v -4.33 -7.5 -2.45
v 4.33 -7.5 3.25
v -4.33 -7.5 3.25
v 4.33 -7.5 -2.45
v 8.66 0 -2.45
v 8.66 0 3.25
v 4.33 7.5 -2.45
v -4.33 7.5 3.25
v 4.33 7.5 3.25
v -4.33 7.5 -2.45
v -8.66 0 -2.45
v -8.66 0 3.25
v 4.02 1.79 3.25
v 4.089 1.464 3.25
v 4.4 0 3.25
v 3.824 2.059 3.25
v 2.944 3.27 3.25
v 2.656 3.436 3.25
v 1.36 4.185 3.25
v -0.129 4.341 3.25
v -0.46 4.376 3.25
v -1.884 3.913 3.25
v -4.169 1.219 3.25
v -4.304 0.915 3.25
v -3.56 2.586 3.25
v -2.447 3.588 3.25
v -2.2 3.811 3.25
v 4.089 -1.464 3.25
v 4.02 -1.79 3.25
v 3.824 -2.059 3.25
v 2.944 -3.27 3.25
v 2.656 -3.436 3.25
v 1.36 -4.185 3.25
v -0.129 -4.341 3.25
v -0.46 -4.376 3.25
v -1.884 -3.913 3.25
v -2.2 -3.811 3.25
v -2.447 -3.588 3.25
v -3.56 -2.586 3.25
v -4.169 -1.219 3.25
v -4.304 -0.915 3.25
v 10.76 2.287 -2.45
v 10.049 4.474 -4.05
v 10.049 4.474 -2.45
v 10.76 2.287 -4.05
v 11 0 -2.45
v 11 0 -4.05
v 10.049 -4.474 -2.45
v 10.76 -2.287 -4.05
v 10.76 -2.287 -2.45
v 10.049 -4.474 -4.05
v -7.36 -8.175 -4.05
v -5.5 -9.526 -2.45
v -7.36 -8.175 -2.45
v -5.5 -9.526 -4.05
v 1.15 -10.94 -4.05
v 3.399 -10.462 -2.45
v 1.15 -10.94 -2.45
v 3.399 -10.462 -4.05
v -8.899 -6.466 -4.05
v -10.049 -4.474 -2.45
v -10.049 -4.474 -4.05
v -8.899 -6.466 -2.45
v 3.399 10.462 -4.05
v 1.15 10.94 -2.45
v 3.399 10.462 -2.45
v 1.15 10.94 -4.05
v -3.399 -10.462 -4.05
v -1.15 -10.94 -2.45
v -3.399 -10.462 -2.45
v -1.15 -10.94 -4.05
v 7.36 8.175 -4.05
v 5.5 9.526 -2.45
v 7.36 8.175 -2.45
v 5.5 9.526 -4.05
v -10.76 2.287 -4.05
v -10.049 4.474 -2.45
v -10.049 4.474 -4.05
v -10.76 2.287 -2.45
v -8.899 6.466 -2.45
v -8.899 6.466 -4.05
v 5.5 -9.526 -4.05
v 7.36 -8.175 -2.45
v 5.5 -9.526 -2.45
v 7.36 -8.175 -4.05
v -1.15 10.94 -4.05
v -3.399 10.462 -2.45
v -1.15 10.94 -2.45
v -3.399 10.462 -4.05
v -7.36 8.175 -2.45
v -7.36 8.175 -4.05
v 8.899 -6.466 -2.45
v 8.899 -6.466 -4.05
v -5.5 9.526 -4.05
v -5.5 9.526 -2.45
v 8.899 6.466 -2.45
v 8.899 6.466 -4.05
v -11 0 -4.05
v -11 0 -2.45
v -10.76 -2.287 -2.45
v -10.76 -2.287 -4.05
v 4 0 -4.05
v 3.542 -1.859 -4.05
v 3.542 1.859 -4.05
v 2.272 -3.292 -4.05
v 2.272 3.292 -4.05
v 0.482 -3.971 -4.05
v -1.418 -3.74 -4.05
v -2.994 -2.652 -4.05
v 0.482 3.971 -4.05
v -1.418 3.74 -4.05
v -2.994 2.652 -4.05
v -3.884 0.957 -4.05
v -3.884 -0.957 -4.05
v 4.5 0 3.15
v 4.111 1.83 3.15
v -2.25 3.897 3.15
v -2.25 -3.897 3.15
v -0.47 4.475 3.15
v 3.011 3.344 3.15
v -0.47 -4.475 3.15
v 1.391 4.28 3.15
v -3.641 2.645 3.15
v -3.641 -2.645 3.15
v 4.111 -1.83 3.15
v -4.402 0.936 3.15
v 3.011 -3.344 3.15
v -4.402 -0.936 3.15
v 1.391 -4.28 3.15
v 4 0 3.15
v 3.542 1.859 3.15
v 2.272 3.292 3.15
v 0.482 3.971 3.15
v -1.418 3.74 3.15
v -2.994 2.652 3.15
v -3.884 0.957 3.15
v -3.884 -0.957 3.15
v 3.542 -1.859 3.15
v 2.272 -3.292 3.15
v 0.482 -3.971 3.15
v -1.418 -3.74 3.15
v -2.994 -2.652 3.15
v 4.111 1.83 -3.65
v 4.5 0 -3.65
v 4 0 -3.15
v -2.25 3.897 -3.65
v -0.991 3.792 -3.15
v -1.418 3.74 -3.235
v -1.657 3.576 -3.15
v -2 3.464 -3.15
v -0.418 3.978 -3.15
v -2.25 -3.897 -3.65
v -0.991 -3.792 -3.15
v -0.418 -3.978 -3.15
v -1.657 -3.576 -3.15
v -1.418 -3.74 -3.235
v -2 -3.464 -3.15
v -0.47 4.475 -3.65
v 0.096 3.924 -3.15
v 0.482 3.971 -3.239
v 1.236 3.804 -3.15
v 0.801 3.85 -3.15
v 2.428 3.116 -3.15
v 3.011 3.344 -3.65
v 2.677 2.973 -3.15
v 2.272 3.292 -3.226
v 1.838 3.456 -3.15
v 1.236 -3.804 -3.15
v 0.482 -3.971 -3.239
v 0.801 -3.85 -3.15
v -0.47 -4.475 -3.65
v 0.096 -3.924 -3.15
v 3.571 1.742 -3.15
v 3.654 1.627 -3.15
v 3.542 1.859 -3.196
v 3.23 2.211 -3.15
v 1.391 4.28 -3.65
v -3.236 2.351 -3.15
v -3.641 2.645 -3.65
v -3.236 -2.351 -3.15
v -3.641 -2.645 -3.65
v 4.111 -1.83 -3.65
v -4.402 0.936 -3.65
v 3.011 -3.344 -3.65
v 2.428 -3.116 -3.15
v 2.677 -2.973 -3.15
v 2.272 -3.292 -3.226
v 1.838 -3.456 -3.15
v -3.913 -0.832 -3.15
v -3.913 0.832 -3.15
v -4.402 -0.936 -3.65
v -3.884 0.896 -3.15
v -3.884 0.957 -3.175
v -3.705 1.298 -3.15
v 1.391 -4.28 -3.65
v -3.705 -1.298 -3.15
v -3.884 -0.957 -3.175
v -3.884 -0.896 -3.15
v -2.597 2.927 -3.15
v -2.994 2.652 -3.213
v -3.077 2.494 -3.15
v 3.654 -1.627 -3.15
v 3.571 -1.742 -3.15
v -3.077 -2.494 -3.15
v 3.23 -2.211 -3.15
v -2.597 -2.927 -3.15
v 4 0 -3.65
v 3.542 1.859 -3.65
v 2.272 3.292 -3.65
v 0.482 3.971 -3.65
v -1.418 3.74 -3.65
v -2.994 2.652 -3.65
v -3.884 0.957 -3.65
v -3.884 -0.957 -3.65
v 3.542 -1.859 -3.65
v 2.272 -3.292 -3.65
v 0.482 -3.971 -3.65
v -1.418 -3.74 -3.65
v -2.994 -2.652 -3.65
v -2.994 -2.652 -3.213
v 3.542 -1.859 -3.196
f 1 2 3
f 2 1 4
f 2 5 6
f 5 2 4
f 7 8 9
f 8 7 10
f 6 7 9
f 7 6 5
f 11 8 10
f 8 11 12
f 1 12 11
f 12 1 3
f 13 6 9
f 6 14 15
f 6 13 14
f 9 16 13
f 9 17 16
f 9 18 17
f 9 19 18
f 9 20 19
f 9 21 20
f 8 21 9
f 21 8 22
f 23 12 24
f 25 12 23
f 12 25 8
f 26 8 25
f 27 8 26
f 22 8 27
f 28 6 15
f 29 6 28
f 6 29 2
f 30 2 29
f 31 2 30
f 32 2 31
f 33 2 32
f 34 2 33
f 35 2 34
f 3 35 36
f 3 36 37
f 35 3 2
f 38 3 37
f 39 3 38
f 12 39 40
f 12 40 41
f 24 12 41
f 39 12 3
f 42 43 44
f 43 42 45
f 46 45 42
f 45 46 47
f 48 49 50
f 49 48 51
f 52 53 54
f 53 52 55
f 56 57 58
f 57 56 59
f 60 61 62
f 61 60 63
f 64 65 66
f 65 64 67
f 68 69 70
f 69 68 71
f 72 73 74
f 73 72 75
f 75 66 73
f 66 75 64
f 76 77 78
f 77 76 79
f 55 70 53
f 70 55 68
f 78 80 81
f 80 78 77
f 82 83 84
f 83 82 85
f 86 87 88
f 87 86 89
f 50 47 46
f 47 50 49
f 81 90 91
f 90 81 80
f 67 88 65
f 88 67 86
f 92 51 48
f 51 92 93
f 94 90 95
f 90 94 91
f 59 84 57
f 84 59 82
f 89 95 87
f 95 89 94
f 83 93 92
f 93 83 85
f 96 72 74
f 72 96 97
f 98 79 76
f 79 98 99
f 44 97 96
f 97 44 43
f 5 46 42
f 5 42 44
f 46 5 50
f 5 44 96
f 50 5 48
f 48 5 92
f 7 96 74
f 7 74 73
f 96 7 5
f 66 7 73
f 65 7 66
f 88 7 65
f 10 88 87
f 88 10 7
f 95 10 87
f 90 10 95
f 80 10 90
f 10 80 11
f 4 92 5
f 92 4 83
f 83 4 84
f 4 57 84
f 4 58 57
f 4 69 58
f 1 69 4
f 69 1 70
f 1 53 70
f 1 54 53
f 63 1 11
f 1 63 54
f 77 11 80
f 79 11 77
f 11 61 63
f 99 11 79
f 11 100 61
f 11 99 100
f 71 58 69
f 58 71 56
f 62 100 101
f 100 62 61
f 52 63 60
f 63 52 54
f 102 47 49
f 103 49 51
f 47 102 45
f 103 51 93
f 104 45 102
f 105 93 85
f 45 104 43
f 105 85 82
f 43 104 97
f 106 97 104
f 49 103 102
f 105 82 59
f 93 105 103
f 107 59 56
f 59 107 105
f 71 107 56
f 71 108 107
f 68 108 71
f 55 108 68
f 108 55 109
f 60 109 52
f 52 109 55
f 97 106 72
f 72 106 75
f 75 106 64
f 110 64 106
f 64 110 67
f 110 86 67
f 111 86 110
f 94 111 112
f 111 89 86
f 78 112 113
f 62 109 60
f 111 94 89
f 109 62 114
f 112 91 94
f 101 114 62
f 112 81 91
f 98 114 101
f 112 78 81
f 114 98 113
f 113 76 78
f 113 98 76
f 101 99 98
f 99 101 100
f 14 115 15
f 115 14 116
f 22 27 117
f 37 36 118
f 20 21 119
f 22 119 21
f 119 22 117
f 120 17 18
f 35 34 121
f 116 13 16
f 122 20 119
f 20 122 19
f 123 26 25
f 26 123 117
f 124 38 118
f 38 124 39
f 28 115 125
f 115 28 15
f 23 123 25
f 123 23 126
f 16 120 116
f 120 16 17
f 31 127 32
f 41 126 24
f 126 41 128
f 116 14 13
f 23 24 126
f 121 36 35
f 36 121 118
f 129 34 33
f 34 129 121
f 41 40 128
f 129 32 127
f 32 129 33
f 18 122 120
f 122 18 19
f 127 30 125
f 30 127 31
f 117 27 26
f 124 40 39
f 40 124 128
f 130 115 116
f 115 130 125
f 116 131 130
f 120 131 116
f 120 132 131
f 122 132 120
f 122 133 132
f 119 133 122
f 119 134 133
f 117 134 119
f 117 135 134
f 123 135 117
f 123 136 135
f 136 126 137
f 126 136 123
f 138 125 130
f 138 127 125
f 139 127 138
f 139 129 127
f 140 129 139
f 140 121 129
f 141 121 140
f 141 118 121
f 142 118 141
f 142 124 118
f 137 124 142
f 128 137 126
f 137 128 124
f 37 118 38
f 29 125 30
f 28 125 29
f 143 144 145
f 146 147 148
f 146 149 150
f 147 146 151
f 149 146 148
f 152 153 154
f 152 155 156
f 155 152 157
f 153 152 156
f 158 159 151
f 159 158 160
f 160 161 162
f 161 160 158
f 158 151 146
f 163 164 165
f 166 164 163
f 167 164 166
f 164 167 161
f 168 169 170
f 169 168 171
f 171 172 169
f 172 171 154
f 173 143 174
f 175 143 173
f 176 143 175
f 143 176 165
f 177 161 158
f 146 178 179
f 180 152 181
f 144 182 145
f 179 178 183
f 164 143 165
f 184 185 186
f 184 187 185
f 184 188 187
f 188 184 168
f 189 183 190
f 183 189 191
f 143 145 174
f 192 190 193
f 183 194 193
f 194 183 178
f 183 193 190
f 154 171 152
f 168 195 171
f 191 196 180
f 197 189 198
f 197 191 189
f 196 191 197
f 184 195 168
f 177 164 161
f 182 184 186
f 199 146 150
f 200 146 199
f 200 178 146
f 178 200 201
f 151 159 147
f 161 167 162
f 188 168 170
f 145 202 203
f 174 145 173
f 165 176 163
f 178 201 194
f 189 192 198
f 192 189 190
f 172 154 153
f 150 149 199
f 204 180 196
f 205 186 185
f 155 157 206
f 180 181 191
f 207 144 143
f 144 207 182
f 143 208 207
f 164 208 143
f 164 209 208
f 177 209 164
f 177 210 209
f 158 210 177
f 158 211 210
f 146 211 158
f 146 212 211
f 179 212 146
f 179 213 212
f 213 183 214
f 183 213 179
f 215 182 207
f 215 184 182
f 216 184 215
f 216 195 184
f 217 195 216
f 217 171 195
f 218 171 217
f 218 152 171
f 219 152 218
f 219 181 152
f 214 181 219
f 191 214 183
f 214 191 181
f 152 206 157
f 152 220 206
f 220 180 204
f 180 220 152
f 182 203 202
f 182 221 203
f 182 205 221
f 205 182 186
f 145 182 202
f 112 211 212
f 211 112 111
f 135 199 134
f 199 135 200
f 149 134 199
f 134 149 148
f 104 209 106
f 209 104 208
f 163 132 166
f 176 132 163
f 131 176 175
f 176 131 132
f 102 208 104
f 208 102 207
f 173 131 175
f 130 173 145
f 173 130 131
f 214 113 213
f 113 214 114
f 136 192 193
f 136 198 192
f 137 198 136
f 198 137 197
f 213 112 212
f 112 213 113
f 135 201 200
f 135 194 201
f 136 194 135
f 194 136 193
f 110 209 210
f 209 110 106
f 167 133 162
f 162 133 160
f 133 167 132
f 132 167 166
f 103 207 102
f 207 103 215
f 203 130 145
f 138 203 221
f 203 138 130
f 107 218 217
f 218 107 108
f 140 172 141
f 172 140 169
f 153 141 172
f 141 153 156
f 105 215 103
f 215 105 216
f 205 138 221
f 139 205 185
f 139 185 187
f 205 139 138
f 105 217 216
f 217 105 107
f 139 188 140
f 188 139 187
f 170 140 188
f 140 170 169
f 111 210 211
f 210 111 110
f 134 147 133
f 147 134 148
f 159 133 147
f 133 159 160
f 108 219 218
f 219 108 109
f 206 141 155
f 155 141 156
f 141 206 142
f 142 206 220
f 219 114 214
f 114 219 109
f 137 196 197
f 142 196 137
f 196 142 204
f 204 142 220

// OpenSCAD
// Parameters
thread_nominal_diameter = 8.0; //[4.0:16.0:0.1]
across_flats = 15.0; //[7.5:30.0:0.1]
thickness = 6.5; //[3.25:13.0:0.1]
hole_diameter = 8.0; //[4.0:16.0:0.1]
threaded_hole = 1; //[0:1:1]
chamfer_size = 0.5; //[0.25:1.0:0.05]
overlap = 0.8; //[0.5:2.0:0.1]
washer_outer_diameter = 22.0; //[11.0:44.0:0.1]
washer_thickness = 1.6; //[0.8:3.2:0.1]

// Nut and Washer - complete geometry
module nut_and_washer() {
  color("DimGray") {
    // Hexagonal prism body
    difference() {
      union() {
        // Hexagonal nut body
        translate([0, 0, 0])
          cylinder(h=thickness, r=across_flats/(2*cos(30)), $fn=6, center=true);
        
        // Washer outer cylinder
        translate([0, 0, -thickness/2 - washer_thickness/2 + overlap])
          cylinder(h=washer_thickness, r=washer_outer_diameter/2, center=true);
      }
      
      // Central through hole
      translate([0, 0, 0])
        cylinder(h=thickness + 2*overlap, r=hole_diameter/2, center=true);
      
      // Washer inner hole
      translate([0, 0, -thickness/2 - washer_thickness/2 + overlap])
        cylinder(h=washer_thickness + 2*overlap, r=hole_diameter/2, center=true);
      
      // Edge chamfers or lead-in
      union() {
        // Top chamfer
        translate([0, 0, thickness/2 - chamfer_size/2 + overlap/2])
          cylinder(h=chamfer_size, r1=hole_diameter/2 + chamfer_size, r2=hole_diameter/2, center=true);
        
        // Bottom chamfer
        translate([0, 0, -thickness/2 + chamfer_size/2 - overlap/2])
          cylinder(h=chamfer_size, r1=hole_diameter/2 + chamfer_size, r2=hole_diameter/2, center=true);
      }
    }
  }
}

// Assembly
module assembly() {
  nut_and_washer();
}

assembly();
